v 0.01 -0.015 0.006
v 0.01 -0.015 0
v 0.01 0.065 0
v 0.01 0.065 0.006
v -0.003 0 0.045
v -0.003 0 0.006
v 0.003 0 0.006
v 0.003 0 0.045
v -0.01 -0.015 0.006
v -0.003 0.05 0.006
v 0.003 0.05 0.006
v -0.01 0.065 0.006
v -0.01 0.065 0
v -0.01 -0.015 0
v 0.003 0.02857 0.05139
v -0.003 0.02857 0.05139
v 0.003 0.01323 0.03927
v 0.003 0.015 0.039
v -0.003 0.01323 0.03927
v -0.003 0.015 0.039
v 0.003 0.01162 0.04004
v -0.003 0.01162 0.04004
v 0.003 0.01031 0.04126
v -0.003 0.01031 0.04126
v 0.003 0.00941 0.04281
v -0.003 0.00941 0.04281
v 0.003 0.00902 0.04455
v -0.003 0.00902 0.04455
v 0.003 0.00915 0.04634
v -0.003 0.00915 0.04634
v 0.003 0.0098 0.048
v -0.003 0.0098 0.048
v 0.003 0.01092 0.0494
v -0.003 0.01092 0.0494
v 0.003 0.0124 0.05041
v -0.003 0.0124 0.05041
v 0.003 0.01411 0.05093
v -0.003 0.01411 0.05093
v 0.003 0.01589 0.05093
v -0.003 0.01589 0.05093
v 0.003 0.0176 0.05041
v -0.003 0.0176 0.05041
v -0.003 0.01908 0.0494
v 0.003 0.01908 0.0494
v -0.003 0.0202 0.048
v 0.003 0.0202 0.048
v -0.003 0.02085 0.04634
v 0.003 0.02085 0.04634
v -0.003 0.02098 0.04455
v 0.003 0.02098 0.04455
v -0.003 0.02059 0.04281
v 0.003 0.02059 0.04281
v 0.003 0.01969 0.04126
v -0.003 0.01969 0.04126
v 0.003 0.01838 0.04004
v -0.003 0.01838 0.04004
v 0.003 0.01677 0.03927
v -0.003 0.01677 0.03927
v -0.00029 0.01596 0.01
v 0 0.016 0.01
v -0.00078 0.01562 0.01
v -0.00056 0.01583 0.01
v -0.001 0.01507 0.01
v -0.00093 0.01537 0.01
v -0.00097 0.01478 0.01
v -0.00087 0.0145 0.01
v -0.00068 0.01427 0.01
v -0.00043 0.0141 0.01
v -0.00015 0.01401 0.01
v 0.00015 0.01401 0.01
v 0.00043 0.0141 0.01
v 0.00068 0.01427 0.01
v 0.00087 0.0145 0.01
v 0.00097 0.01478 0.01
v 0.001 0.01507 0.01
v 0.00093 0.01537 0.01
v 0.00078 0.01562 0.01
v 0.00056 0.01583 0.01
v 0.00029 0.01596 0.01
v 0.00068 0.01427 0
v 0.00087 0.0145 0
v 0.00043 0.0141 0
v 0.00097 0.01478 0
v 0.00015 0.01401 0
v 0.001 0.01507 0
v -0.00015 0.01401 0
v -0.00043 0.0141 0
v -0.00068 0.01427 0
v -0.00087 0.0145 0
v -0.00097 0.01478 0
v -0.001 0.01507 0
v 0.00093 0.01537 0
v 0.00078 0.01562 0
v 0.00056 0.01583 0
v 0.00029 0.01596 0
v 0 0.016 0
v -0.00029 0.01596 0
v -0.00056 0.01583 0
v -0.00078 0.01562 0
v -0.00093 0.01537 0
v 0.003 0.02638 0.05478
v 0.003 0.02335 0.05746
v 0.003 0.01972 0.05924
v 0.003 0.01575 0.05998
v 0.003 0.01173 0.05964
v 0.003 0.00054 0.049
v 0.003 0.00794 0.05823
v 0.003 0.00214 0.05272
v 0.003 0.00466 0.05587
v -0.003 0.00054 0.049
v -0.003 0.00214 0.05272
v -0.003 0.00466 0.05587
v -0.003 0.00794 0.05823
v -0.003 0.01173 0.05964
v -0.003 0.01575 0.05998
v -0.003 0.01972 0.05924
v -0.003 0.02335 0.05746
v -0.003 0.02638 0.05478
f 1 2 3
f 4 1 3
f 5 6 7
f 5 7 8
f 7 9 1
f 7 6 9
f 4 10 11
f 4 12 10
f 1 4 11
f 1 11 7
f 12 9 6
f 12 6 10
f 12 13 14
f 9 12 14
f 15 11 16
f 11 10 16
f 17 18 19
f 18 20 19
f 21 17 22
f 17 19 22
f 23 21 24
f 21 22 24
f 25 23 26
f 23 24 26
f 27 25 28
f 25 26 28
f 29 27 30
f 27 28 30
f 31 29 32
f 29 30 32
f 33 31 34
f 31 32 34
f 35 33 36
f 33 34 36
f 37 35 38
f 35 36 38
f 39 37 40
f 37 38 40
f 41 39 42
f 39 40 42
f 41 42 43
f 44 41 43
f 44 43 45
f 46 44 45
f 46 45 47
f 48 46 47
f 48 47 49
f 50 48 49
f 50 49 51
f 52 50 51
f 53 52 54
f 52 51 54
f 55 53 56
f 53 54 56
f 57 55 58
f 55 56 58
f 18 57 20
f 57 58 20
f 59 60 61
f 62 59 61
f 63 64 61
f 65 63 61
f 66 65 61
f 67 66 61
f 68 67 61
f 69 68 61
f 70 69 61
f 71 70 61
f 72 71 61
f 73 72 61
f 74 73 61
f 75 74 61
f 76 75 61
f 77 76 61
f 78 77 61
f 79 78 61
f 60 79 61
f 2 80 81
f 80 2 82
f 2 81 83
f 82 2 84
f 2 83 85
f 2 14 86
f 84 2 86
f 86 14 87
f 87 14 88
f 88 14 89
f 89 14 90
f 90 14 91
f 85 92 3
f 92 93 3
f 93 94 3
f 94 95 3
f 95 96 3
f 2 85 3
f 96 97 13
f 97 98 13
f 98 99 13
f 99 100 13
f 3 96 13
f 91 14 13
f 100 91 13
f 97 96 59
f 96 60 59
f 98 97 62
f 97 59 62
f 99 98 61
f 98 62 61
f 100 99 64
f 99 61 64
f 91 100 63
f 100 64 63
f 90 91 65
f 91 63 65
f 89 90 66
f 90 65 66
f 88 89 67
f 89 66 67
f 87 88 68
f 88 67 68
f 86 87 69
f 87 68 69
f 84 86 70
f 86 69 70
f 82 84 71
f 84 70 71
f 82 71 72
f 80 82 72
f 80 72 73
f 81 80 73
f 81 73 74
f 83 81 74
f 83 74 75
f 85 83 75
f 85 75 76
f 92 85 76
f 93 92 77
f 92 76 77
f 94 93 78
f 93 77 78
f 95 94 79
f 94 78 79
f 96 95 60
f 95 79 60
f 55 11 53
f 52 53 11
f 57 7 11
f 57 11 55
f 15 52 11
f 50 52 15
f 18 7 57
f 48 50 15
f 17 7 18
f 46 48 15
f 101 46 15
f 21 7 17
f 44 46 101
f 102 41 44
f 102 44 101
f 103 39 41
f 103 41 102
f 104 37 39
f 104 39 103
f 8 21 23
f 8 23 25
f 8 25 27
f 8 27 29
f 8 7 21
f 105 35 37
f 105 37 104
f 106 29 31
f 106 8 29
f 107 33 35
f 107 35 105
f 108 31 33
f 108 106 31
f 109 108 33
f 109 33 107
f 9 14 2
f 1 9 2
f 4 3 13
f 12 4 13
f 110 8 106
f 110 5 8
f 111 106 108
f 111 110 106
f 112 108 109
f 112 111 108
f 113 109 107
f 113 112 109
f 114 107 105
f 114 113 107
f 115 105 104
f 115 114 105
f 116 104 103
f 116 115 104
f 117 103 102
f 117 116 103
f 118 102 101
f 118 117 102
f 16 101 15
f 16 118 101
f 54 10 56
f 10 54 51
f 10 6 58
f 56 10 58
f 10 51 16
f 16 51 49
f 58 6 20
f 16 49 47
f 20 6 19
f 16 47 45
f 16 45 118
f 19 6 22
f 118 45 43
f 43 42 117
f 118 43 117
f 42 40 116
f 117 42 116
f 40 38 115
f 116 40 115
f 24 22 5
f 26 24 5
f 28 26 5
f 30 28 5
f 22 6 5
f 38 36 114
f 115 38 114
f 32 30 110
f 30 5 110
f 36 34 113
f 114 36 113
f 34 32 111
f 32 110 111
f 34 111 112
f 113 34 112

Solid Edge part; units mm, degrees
sketch "Sketch1" plane through (0, 0, 0) normal (1, 0, 0) x (0, 1, 0)
  line L0 (0, 0) -> (0.05, 0)
  line L1 (0.05, 0) -> (0.05, 0.006)
  line L2 (0.05, 0.006) -> (0.0286, 0.0514)
  line L3 (0, 0) -> (0, 0.045)
  arc A0 (0.0286, 0.0514) -> (0, 0.045) centre (0.015, 0.045) ccw
  dimension "D1" = 0.015
  dimension "D2" = 0.05
extrude "Protrusion1" add sketch "Sketch1" along normal mid plane 0.006
hole "Bohrung_1" at (0.003, 0.015, 0.045) direction (-1, 0, 0) diameter 0.012 depth 3.175
sketch "Sketch2" plane through (0, 0, 0) normal (0, 0, 1) x (1, 0, 0)
  line L0 (0.01, -0.015) -> (0.01, 0.065)
  line L1 (0.01, 0.065) -> (-0.01, 0.065)
  line L2 (-0.01, 0.065) -> (-0.01, -0.015)
  line L3 (-0.01, -0.015) -> (0.01, -0.015)
  dimension "D1" = 0.02
  dimension "D2" = 0.08
  dimension "D3" = 0.015
extrude "Ausprägung_2" add sketch "Sketch2" along normal blind 0.006
hole "Bohrung_2" at (0, 0.015, 0) direction (0, 0, 1) diameter 0.002 depth 0.01
